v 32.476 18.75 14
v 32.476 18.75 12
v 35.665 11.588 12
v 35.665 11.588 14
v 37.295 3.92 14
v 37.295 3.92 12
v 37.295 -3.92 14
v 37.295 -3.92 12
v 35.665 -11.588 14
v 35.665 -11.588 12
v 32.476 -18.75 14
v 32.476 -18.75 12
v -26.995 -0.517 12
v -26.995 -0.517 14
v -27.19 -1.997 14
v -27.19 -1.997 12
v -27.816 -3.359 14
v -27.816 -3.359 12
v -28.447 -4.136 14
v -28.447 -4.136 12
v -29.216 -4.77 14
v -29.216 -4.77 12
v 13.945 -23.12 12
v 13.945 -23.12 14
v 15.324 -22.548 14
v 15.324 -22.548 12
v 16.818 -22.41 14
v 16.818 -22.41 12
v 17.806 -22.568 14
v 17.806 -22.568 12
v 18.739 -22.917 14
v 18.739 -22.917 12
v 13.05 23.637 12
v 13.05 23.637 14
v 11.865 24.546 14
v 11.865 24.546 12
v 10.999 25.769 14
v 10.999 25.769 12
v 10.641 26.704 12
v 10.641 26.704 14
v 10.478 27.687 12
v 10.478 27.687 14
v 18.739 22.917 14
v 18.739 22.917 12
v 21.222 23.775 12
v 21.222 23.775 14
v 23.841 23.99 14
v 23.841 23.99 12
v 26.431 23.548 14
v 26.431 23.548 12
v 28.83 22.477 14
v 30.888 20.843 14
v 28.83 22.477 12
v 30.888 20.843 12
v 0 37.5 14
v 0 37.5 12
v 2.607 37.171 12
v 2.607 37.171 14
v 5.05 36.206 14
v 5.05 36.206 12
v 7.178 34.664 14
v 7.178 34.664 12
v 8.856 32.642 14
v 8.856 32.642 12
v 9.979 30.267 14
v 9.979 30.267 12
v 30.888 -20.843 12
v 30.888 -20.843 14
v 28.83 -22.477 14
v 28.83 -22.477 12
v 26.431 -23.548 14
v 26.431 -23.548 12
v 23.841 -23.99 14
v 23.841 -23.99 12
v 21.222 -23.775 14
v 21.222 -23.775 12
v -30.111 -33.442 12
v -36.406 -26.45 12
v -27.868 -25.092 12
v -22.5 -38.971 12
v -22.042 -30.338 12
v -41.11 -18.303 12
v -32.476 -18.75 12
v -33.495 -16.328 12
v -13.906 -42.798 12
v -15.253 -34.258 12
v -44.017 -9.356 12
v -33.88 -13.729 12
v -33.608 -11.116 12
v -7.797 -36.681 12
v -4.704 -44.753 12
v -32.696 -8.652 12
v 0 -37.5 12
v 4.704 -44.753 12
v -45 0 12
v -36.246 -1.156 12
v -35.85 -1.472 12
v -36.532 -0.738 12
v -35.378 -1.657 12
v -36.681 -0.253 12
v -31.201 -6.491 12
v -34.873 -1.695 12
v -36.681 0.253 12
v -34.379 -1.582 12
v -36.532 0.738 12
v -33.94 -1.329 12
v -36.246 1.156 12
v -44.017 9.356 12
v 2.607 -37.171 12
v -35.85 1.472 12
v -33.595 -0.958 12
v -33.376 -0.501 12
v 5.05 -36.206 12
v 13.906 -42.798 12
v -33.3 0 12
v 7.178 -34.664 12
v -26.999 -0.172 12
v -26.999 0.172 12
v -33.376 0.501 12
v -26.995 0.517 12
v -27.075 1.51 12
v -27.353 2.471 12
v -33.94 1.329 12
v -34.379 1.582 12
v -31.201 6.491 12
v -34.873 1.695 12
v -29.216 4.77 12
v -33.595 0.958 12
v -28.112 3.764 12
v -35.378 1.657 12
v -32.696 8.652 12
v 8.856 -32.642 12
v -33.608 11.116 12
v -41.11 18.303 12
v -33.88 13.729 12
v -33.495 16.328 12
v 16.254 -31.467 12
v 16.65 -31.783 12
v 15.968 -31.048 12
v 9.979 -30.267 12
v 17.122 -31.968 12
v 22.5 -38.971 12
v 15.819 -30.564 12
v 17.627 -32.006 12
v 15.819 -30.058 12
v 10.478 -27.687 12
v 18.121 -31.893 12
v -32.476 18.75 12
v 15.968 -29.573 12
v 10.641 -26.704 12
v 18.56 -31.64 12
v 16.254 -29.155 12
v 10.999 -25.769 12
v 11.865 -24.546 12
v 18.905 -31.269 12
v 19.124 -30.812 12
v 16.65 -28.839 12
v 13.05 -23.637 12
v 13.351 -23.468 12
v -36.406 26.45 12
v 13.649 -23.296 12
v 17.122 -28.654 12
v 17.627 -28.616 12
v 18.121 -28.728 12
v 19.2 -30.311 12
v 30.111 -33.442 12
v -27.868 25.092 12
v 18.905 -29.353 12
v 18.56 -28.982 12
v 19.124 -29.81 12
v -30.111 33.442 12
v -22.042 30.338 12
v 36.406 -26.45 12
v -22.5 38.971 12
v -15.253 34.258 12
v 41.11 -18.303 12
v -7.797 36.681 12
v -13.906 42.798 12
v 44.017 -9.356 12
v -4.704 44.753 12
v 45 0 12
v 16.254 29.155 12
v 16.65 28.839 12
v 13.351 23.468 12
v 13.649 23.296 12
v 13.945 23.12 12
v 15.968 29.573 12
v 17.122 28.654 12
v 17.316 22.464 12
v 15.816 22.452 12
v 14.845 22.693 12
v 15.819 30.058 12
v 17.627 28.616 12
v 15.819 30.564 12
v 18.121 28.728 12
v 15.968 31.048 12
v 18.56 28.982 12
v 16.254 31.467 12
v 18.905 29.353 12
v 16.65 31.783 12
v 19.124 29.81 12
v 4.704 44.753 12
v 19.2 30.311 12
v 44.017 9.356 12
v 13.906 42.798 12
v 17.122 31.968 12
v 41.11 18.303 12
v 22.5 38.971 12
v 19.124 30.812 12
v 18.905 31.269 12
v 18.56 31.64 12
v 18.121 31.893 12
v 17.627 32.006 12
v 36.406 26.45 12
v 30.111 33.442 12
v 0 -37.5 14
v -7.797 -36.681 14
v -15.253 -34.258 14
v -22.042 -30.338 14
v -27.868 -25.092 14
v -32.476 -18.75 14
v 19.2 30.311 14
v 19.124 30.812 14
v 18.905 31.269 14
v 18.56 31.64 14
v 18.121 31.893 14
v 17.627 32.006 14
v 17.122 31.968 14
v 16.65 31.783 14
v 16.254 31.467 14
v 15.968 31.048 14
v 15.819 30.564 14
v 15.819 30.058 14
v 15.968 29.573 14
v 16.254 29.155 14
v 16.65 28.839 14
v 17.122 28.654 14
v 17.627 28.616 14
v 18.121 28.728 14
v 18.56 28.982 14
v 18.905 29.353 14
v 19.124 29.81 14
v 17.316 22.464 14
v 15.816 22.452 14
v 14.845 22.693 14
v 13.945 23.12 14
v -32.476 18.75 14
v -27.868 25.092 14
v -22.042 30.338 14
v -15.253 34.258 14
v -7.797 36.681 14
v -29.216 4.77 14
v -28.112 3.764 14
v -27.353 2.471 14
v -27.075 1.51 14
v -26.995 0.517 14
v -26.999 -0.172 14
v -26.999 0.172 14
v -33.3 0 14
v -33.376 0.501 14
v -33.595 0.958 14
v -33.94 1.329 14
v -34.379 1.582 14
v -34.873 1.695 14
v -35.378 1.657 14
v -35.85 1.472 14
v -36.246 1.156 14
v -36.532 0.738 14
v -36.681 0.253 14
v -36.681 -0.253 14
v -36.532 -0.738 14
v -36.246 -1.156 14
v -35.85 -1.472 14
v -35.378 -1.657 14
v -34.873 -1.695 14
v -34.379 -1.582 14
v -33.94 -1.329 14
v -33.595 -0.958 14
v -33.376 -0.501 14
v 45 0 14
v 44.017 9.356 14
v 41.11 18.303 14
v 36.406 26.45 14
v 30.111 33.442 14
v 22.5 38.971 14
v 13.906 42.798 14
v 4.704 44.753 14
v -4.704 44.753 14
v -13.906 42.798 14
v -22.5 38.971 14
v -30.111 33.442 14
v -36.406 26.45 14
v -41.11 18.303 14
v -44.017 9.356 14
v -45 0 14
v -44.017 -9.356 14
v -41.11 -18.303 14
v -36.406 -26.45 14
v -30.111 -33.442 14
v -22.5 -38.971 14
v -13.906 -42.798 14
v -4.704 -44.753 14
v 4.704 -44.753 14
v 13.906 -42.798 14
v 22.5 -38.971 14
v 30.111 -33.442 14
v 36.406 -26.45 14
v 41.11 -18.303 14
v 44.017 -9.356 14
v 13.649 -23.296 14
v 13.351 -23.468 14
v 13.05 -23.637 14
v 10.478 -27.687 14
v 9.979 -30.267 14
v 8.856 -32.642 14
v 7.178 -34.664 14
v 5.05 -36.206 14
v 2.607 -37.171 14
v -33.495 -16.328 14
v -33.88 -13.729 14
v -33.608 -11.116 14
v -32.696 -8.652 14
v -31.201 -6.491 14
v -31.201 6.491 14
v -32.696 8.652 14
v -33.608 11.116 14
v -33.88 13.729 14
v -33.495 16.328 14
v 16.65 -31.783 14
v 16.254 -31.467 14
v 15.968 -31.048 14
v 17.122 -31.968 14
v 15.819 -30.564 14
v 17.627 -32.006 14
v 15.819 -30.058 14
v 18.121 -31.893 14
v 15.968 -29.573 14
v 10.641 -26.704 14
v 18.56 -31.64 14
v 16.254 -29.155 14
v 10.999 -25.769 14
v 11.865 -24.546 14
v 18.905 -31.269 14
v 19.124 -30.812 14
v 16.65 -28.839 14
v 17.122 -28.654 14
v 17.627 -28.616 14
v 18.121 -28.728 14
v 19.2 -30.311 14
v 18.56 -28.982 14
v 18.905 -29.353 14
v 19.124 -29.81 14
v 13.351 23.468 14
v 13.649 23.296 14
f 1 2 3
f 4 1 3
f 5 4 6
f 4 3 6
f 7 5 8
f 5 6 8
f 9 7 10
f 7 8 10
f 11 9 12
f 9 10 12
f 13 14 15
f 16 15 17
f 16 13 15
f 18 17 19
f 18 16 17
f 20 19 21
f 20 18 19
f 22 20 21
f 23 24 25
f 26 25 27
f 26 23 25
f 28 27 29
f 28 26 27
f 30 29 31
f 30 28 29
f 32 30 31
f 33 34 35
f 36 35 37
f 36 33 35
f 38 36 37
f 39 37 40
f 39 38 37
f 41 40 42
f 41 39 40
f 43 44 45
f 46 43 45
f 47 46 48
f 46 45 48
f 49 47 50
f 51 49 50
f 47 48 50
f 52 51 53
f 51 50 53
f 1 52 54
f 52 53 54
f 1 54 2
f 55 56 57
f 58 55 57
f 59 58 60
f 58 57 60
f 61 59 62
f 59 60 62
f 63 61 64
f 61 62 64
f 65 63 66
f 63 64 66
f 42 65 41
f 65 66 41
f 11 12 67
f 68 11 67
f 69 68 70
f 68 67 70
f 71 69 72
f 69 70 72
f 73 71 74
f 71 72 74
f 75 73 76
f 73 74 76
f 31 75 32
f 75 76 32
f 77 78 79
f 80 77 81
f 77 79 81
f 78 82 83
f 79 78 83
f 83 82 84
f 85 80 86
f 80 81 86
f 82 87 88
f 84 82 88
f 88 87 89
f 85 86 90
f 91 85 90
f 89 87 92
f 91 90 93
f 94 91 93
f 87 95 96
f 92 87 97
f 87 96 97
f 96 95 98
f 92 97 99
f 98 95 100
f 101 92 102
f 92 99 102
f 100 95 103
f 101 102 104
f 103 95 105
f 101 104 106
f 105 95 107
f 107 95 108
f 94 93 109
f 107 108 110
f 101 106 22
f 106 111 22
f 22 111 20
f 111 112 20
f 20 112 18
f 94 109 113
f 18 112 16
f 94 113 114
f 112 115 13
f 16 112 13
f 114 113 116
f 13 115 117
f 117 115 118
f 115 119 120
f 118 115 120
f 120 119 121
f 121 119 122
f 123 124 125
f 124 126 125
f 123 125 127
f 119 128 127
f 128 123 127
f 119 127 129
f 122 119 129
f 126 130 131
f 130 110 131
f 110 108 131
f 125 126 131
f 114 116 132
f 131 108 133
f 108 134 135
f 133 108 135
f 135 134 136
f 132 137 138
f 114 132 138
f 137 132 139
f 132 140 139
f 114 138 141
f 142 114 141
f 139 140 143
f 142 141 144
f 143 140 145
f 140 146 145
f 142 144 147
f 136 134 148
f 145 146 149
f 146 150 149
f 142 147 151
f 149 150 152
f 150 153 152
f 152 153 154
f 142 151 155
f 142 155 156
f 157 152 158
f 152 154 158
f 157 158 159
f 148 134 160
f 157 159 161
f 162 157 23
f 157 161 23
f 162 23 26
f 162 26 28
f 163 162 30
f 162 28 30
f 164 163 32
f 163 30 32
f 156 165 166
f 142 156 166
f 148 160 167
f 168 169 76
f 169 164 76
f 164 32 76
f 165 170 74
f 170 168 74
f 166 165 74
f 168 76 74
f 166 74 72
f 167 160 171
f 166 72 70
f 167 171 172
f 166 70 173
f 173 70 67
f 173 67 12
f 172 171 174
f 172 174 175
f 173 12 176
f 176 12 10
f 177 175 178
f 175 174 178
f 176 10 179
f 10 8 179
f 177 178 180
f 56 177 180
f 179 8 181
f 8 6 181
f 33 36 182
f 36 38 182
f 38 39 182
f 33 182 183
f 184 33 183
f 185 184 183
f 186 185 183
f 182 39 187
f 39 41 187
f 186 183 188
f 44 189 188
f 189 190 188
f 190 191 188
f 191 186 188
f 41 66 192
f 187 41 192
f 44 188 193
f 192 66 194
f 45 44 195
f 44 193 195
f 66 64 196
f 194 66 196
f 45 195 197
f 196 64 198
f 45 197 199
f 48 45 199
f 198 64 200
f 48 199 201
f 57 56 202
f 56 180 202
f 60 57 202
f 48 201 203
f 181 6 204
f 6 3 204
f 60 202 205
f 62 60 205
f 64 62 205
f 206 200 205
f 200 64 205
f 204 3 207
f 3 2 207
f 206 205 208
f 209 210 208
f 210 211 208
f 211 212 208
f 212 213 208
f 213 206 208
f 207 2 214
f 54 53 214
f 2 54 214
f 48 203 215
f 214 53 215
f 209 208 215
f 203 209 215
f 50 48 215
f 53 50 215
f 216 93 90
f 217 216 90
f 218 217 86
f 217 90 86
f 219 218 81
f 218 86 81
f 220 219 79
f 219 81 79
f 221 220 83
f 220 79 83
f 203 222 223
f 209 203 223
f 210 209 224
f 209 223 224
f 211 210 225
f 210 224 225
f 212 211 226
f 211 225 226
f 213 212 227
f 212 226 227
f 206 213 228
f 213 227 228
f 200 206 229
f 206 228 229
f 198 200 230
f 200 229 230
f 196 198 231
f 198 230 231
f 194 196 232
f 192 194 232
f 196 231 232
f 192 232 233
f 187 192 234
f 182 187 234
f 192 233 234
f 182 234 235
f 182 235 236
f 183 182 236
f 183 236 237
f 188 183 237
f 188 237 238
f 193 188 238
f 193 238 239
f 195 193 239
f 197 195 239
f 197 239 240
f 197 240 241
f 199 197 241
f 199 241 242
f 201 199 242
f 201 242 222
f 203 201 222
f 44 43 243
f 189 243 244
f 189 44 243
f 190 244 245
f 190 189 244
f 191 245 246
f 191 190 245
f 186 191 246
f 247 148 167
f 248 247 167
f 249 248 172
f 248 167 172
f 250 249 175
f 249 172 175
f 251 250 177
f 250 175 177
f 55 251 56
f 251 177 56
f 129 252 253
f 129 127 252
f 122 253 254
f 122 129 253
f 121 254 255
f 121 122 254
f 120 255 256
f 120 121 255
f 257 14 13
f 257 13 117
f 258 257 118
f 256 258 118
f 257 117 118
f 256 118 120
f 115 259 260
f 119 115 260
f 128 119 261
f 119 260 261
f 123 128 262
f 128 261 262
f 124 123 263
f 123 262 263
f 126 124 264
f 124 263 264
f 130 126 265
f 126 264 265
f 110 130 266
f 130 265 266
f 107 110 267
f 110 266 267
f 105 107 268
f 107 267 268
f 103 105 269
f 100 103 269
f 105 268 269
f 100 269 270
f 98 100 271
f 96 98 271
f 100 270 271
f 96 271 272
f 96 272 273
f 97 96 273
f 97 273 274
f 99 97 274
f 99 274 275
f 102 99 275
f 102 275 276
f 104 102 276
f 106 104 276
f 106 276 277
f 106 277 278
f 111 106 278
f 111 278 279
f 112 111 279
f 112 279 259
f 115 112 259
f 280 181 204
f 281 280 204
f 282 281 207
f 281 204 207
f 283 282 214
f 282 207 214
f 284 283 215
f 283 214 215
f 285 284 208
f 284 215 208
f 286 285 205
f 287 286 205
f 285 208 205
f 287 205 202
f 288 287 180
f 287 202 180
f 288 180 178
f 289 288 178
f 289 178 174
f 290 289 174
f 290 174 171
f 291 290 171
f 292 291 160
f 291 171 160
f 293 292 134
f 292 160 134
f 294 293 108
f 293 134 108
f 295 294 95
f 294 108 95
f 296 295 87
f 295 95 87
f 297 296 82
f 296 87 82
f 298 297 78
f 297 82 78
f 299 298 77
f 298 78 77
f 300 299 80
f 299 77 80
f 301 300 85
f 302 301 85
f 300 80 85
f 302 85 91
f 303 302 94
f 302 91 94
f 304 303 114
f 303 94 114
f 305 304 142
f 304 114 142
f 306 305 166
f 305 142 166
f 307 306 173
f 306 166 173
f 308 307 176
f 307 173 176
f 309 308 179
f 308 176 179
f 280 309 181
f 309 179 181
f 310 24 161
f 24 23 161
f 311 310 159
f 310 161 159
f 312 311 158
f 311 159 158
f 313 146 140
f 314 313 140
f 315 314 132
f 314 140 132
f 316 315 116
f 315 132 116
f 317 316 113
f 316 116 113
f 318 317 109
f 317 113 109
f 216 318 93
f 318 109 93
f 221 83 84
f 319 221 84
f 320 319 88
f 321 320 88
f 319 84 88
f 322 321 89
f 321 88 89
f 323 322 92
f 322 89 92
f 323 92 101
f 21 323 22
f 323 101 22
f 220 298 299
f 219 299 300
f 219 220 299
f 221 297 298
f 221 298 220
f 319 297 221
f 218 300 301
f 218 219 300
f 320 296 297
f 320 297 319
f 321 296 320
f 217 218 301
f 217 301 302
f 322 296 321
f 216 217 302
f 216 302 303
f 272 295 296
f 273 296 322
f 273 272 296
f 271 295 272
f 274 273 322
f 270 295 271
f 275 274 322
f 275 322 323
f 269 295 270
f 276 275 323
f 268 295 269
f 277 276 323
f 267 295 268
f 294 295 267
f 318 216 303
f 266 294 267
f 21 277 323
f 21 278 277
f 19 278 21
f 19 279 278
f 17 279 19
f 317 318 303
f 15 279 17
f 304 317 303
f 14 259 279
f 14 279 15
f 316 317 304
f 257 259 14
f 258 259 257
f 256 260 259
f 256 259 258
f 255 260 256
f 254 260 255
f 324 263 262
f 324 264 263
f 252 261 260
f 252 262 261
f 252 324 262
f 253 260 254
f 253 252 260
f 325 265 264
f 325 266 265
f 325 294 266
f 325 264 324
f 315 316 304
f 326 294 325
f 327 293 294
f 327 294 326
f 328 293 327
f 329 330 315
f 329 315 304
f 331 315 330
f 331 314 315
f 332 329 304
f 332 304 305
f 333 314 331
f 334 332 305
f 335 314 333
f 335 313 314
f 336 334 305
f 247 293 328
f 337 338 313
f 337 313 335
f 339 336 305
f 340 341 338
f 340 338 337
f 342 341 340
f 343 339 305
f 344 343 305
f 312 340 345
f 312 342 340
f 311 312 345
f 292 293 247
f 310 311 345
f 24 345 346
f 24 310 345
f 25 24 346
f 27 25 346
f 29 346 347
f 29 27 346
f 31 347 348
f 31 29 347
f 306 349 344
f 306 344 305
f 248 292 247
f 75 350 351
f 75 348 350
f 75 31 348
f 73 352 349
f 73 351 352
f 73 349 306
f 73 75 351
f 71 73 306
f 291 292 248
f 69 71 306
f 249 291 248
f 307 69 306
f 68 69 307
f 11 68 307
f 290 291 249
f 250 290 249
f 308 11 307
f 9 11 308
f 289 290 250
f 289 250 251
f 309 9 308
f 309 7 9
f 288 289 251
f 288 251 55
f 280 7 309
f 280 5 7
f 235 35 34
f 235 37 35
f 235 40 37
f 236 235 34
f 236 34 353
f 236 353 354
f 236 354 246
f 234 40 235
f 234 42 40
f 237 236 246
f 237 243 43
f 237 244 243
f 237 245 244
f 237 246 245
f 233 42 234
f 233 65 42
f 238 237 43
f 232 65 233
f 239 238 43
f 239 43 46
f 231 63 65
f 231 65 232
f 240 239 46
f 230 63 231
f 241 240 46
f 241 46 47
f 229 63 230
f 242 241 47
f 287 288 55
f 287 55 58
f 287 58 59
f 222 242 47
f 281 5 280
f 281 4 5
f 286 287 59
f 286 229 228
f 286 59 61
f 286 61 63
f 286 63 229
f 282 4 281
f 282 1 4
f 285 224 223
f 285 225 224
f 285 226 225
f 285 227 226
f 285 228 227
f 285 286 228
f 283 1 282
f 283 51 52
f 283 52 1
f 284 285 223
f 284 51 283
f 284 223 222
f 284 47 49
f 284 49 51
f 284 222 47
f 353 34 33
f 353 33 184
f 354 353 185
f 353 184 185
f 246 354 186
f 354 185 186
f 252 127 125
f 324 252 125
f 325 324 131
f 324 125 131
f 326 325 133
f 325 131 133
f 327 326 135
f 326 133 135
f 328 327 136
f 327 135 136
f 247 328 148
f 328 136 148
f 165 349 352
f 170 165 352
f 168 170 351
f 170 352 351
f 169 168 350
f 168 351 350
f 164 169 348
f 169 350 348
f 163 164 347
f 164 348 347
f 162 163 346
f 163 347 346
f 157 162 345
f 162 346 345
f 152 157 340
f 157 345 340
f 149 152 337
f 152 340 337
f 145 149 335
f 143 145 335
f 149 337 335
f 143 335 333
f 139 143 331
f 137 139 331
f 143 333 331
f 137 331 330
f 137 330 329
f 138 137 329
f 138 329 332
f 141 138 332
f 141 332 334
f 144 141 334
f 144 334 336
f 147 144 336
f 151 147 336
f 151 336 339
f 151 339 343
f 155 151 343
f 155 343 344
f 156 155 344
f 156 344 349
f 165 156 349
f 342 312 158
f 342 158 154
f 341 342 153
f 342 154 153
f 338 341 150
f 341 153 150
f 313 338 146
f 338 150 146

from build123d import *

# Parameters (mm, degrees)
SKETCH_1_R          = 40
EXTRUDE_1_DEPTH     = 12
SKETCH_8_R          = 45
EXTRUDE_3_DEPTH     = 2
SKETCH_2_R          = 7.5
CUT_EXTRUDE_1_DEPTH = 66.161338231
HOLE_WIZARD_M32_D   = 3.4
CUT_EXTRUDE_2_DEPTH = 66.161338231
HOLE_WIZARD_M33_D   = 3.4
SKETCH_17_R         = 42.242904023
CUT_EXTRUDE_3_DEPTH = 12
SKETCH_18_R         = 27
CUT_EXTRUDE_4_DEPTH = 64.671029519
FILLET_1_R          = 5


with BuildPart() as part:
    # Эскиз1 → Бобышка-Вытянуть1 (new body)
    with BuildSketch(Plane.XY):
        Circle(SKETCH_1_R)
    extrude(amount=EXTRUDE_1_DEPTH)

    # Эскиз8 → Бобышка-Вытянуть3 (add)
    with BuildSketch(Plane.XY.offset(12)):
        Circle(SKETCH_8_R)
    extrude(amount=EXTRUDE_3_DEPTH)

    # Эскиз2 → Вырез-Вытянуть1 (cut, through all)
    with BuildSketch(Plane(origin=(0, 0, 14), x_dir=(-1, 0, 0), z_dir=(0, 0, -1))):
        Circle(SKETCH_2_R)
    extrude(amount=CUT_EXTRUDE_1_DEPTH, mode=Mode.SUBTRACT)

    # Отверстие с зазором M32 (through all)
    with Locations(Plane.XY.offset(14)):
        with Locations((6.25, 10.825317547), (-12.5, 0), (6.25, -10.825317547)):
            Hole(HOLE_WIZARD_M32_D / 2)

    # Эскиз10 → Вырез-Вытянуть2 (cut, through all)
    with BuildSketch(Plane(origin=(0, 0, 0), x_dir=(-1, 0, 0), z_dir=(0, 0, -1))):
        with BuildLine():
            ThreePointArc((32.475952642, -18.75), (28.632685902, -4.40673326), (14.289419162, -8.25))
            ThreePointArc((14.289419162, -8.25), (8.25, -14.289419162), (0, -16.5))
            ThreePointArc((0, -16.5), (-10.5, -27), (0, -37.5))
            ThreePointArc((0, -37.5), (18.75, -32.475952642), (32.475952642, -18.75))
        make_face()
        with BuildLine():
            ThreePointArc((32.475952642, 18.75), (18.75, 32.475952642), (0, 37.5))
            ThreePointArc((0, 37.5), (-10.5, 27), (0, 16.5))
            ThreePointArc((0, 16.5), (8.25, 14.289419162), (14.289419162, 8.25))
            ThreePointArc((14.289419162, 8.25), (28.632685902, 4.40673326), (32.475952642, 18.75))
        make_face()
        with BuildLine():
            ThreePointArc((-32.475952642, -18.75), (-18.132685902, -22.59326674), (-14.289419162, -8.25))
            ThreePointArc((-14.289419162, -8.25), (-16.5, 0), (-14.289419162, 8.25))
            ThreePointArc((-14.289419162, 8.25), (-18.132685902, 22.59326674), (-32.475952642, 18.75))
            ThreePointArc((-32.475952642, 18.75), (-37.5, 0), (-32.475952642, -18.75))
        make_face()
    extrude(amount=-CUT_EXTRUDE_2_DEPTH, mode=Mode.SUBTRACT)

    # Отверстие с зазором M33 (through all)
    with Locations(Plane(origin=(0, 0, 0), x_dir=(-1, 0, 0), z_dir=(0, 0, -1))):
        with Locations((-17.5, 30.310889132), (35, 0), (-17.5, -30.310889132)):
            Hole(HOLE_WIZARD_M33_D / 2)

    # Эскиз17 → Вырез-Вытянуть3 (cut)
    with BuildSketch(Plane(origin=(0, 0, 0), x_dir=(-1, 0, 0), z_dir=(0, 0, -1))):
        Circle(SKETCH_17_R)
    extrude(amount=-CUT_EXTRUDE_3_DEPTH, mode=Mode.SUBTRACT)

    # Эскиз18 → Вырез-Вытянуть4 (cut, through all)
    with BuildSketch(Plane(origin=(0, 0, 12), x_dir=(-1, 0, 0), z_dir=(0, 0, -1))):
        Circle(SKETCH_18_R)
    extrude(amount=-CUT_EXTRUDE_4_DEPTH, mode=Mode.SUBTRACT)

    # Скругление1
    fillet_1_edges = [part.edges().sort_by_distance(p)[0] for p in [
        (16.464754658, 21.398875065, 13),
        (10.29959209, 24.958333333, 13),
        (-26.764346748, 3.559458268, 13),
        (-26.764346748, -3.559458268, 13),
        (10.29959209, -24.958333333, 13),
        (16.464754658, -21.398875065, 13),
    ]]
    fillet(fillet_1_edges, radius=FILLET_1_R)


solid = part.part
